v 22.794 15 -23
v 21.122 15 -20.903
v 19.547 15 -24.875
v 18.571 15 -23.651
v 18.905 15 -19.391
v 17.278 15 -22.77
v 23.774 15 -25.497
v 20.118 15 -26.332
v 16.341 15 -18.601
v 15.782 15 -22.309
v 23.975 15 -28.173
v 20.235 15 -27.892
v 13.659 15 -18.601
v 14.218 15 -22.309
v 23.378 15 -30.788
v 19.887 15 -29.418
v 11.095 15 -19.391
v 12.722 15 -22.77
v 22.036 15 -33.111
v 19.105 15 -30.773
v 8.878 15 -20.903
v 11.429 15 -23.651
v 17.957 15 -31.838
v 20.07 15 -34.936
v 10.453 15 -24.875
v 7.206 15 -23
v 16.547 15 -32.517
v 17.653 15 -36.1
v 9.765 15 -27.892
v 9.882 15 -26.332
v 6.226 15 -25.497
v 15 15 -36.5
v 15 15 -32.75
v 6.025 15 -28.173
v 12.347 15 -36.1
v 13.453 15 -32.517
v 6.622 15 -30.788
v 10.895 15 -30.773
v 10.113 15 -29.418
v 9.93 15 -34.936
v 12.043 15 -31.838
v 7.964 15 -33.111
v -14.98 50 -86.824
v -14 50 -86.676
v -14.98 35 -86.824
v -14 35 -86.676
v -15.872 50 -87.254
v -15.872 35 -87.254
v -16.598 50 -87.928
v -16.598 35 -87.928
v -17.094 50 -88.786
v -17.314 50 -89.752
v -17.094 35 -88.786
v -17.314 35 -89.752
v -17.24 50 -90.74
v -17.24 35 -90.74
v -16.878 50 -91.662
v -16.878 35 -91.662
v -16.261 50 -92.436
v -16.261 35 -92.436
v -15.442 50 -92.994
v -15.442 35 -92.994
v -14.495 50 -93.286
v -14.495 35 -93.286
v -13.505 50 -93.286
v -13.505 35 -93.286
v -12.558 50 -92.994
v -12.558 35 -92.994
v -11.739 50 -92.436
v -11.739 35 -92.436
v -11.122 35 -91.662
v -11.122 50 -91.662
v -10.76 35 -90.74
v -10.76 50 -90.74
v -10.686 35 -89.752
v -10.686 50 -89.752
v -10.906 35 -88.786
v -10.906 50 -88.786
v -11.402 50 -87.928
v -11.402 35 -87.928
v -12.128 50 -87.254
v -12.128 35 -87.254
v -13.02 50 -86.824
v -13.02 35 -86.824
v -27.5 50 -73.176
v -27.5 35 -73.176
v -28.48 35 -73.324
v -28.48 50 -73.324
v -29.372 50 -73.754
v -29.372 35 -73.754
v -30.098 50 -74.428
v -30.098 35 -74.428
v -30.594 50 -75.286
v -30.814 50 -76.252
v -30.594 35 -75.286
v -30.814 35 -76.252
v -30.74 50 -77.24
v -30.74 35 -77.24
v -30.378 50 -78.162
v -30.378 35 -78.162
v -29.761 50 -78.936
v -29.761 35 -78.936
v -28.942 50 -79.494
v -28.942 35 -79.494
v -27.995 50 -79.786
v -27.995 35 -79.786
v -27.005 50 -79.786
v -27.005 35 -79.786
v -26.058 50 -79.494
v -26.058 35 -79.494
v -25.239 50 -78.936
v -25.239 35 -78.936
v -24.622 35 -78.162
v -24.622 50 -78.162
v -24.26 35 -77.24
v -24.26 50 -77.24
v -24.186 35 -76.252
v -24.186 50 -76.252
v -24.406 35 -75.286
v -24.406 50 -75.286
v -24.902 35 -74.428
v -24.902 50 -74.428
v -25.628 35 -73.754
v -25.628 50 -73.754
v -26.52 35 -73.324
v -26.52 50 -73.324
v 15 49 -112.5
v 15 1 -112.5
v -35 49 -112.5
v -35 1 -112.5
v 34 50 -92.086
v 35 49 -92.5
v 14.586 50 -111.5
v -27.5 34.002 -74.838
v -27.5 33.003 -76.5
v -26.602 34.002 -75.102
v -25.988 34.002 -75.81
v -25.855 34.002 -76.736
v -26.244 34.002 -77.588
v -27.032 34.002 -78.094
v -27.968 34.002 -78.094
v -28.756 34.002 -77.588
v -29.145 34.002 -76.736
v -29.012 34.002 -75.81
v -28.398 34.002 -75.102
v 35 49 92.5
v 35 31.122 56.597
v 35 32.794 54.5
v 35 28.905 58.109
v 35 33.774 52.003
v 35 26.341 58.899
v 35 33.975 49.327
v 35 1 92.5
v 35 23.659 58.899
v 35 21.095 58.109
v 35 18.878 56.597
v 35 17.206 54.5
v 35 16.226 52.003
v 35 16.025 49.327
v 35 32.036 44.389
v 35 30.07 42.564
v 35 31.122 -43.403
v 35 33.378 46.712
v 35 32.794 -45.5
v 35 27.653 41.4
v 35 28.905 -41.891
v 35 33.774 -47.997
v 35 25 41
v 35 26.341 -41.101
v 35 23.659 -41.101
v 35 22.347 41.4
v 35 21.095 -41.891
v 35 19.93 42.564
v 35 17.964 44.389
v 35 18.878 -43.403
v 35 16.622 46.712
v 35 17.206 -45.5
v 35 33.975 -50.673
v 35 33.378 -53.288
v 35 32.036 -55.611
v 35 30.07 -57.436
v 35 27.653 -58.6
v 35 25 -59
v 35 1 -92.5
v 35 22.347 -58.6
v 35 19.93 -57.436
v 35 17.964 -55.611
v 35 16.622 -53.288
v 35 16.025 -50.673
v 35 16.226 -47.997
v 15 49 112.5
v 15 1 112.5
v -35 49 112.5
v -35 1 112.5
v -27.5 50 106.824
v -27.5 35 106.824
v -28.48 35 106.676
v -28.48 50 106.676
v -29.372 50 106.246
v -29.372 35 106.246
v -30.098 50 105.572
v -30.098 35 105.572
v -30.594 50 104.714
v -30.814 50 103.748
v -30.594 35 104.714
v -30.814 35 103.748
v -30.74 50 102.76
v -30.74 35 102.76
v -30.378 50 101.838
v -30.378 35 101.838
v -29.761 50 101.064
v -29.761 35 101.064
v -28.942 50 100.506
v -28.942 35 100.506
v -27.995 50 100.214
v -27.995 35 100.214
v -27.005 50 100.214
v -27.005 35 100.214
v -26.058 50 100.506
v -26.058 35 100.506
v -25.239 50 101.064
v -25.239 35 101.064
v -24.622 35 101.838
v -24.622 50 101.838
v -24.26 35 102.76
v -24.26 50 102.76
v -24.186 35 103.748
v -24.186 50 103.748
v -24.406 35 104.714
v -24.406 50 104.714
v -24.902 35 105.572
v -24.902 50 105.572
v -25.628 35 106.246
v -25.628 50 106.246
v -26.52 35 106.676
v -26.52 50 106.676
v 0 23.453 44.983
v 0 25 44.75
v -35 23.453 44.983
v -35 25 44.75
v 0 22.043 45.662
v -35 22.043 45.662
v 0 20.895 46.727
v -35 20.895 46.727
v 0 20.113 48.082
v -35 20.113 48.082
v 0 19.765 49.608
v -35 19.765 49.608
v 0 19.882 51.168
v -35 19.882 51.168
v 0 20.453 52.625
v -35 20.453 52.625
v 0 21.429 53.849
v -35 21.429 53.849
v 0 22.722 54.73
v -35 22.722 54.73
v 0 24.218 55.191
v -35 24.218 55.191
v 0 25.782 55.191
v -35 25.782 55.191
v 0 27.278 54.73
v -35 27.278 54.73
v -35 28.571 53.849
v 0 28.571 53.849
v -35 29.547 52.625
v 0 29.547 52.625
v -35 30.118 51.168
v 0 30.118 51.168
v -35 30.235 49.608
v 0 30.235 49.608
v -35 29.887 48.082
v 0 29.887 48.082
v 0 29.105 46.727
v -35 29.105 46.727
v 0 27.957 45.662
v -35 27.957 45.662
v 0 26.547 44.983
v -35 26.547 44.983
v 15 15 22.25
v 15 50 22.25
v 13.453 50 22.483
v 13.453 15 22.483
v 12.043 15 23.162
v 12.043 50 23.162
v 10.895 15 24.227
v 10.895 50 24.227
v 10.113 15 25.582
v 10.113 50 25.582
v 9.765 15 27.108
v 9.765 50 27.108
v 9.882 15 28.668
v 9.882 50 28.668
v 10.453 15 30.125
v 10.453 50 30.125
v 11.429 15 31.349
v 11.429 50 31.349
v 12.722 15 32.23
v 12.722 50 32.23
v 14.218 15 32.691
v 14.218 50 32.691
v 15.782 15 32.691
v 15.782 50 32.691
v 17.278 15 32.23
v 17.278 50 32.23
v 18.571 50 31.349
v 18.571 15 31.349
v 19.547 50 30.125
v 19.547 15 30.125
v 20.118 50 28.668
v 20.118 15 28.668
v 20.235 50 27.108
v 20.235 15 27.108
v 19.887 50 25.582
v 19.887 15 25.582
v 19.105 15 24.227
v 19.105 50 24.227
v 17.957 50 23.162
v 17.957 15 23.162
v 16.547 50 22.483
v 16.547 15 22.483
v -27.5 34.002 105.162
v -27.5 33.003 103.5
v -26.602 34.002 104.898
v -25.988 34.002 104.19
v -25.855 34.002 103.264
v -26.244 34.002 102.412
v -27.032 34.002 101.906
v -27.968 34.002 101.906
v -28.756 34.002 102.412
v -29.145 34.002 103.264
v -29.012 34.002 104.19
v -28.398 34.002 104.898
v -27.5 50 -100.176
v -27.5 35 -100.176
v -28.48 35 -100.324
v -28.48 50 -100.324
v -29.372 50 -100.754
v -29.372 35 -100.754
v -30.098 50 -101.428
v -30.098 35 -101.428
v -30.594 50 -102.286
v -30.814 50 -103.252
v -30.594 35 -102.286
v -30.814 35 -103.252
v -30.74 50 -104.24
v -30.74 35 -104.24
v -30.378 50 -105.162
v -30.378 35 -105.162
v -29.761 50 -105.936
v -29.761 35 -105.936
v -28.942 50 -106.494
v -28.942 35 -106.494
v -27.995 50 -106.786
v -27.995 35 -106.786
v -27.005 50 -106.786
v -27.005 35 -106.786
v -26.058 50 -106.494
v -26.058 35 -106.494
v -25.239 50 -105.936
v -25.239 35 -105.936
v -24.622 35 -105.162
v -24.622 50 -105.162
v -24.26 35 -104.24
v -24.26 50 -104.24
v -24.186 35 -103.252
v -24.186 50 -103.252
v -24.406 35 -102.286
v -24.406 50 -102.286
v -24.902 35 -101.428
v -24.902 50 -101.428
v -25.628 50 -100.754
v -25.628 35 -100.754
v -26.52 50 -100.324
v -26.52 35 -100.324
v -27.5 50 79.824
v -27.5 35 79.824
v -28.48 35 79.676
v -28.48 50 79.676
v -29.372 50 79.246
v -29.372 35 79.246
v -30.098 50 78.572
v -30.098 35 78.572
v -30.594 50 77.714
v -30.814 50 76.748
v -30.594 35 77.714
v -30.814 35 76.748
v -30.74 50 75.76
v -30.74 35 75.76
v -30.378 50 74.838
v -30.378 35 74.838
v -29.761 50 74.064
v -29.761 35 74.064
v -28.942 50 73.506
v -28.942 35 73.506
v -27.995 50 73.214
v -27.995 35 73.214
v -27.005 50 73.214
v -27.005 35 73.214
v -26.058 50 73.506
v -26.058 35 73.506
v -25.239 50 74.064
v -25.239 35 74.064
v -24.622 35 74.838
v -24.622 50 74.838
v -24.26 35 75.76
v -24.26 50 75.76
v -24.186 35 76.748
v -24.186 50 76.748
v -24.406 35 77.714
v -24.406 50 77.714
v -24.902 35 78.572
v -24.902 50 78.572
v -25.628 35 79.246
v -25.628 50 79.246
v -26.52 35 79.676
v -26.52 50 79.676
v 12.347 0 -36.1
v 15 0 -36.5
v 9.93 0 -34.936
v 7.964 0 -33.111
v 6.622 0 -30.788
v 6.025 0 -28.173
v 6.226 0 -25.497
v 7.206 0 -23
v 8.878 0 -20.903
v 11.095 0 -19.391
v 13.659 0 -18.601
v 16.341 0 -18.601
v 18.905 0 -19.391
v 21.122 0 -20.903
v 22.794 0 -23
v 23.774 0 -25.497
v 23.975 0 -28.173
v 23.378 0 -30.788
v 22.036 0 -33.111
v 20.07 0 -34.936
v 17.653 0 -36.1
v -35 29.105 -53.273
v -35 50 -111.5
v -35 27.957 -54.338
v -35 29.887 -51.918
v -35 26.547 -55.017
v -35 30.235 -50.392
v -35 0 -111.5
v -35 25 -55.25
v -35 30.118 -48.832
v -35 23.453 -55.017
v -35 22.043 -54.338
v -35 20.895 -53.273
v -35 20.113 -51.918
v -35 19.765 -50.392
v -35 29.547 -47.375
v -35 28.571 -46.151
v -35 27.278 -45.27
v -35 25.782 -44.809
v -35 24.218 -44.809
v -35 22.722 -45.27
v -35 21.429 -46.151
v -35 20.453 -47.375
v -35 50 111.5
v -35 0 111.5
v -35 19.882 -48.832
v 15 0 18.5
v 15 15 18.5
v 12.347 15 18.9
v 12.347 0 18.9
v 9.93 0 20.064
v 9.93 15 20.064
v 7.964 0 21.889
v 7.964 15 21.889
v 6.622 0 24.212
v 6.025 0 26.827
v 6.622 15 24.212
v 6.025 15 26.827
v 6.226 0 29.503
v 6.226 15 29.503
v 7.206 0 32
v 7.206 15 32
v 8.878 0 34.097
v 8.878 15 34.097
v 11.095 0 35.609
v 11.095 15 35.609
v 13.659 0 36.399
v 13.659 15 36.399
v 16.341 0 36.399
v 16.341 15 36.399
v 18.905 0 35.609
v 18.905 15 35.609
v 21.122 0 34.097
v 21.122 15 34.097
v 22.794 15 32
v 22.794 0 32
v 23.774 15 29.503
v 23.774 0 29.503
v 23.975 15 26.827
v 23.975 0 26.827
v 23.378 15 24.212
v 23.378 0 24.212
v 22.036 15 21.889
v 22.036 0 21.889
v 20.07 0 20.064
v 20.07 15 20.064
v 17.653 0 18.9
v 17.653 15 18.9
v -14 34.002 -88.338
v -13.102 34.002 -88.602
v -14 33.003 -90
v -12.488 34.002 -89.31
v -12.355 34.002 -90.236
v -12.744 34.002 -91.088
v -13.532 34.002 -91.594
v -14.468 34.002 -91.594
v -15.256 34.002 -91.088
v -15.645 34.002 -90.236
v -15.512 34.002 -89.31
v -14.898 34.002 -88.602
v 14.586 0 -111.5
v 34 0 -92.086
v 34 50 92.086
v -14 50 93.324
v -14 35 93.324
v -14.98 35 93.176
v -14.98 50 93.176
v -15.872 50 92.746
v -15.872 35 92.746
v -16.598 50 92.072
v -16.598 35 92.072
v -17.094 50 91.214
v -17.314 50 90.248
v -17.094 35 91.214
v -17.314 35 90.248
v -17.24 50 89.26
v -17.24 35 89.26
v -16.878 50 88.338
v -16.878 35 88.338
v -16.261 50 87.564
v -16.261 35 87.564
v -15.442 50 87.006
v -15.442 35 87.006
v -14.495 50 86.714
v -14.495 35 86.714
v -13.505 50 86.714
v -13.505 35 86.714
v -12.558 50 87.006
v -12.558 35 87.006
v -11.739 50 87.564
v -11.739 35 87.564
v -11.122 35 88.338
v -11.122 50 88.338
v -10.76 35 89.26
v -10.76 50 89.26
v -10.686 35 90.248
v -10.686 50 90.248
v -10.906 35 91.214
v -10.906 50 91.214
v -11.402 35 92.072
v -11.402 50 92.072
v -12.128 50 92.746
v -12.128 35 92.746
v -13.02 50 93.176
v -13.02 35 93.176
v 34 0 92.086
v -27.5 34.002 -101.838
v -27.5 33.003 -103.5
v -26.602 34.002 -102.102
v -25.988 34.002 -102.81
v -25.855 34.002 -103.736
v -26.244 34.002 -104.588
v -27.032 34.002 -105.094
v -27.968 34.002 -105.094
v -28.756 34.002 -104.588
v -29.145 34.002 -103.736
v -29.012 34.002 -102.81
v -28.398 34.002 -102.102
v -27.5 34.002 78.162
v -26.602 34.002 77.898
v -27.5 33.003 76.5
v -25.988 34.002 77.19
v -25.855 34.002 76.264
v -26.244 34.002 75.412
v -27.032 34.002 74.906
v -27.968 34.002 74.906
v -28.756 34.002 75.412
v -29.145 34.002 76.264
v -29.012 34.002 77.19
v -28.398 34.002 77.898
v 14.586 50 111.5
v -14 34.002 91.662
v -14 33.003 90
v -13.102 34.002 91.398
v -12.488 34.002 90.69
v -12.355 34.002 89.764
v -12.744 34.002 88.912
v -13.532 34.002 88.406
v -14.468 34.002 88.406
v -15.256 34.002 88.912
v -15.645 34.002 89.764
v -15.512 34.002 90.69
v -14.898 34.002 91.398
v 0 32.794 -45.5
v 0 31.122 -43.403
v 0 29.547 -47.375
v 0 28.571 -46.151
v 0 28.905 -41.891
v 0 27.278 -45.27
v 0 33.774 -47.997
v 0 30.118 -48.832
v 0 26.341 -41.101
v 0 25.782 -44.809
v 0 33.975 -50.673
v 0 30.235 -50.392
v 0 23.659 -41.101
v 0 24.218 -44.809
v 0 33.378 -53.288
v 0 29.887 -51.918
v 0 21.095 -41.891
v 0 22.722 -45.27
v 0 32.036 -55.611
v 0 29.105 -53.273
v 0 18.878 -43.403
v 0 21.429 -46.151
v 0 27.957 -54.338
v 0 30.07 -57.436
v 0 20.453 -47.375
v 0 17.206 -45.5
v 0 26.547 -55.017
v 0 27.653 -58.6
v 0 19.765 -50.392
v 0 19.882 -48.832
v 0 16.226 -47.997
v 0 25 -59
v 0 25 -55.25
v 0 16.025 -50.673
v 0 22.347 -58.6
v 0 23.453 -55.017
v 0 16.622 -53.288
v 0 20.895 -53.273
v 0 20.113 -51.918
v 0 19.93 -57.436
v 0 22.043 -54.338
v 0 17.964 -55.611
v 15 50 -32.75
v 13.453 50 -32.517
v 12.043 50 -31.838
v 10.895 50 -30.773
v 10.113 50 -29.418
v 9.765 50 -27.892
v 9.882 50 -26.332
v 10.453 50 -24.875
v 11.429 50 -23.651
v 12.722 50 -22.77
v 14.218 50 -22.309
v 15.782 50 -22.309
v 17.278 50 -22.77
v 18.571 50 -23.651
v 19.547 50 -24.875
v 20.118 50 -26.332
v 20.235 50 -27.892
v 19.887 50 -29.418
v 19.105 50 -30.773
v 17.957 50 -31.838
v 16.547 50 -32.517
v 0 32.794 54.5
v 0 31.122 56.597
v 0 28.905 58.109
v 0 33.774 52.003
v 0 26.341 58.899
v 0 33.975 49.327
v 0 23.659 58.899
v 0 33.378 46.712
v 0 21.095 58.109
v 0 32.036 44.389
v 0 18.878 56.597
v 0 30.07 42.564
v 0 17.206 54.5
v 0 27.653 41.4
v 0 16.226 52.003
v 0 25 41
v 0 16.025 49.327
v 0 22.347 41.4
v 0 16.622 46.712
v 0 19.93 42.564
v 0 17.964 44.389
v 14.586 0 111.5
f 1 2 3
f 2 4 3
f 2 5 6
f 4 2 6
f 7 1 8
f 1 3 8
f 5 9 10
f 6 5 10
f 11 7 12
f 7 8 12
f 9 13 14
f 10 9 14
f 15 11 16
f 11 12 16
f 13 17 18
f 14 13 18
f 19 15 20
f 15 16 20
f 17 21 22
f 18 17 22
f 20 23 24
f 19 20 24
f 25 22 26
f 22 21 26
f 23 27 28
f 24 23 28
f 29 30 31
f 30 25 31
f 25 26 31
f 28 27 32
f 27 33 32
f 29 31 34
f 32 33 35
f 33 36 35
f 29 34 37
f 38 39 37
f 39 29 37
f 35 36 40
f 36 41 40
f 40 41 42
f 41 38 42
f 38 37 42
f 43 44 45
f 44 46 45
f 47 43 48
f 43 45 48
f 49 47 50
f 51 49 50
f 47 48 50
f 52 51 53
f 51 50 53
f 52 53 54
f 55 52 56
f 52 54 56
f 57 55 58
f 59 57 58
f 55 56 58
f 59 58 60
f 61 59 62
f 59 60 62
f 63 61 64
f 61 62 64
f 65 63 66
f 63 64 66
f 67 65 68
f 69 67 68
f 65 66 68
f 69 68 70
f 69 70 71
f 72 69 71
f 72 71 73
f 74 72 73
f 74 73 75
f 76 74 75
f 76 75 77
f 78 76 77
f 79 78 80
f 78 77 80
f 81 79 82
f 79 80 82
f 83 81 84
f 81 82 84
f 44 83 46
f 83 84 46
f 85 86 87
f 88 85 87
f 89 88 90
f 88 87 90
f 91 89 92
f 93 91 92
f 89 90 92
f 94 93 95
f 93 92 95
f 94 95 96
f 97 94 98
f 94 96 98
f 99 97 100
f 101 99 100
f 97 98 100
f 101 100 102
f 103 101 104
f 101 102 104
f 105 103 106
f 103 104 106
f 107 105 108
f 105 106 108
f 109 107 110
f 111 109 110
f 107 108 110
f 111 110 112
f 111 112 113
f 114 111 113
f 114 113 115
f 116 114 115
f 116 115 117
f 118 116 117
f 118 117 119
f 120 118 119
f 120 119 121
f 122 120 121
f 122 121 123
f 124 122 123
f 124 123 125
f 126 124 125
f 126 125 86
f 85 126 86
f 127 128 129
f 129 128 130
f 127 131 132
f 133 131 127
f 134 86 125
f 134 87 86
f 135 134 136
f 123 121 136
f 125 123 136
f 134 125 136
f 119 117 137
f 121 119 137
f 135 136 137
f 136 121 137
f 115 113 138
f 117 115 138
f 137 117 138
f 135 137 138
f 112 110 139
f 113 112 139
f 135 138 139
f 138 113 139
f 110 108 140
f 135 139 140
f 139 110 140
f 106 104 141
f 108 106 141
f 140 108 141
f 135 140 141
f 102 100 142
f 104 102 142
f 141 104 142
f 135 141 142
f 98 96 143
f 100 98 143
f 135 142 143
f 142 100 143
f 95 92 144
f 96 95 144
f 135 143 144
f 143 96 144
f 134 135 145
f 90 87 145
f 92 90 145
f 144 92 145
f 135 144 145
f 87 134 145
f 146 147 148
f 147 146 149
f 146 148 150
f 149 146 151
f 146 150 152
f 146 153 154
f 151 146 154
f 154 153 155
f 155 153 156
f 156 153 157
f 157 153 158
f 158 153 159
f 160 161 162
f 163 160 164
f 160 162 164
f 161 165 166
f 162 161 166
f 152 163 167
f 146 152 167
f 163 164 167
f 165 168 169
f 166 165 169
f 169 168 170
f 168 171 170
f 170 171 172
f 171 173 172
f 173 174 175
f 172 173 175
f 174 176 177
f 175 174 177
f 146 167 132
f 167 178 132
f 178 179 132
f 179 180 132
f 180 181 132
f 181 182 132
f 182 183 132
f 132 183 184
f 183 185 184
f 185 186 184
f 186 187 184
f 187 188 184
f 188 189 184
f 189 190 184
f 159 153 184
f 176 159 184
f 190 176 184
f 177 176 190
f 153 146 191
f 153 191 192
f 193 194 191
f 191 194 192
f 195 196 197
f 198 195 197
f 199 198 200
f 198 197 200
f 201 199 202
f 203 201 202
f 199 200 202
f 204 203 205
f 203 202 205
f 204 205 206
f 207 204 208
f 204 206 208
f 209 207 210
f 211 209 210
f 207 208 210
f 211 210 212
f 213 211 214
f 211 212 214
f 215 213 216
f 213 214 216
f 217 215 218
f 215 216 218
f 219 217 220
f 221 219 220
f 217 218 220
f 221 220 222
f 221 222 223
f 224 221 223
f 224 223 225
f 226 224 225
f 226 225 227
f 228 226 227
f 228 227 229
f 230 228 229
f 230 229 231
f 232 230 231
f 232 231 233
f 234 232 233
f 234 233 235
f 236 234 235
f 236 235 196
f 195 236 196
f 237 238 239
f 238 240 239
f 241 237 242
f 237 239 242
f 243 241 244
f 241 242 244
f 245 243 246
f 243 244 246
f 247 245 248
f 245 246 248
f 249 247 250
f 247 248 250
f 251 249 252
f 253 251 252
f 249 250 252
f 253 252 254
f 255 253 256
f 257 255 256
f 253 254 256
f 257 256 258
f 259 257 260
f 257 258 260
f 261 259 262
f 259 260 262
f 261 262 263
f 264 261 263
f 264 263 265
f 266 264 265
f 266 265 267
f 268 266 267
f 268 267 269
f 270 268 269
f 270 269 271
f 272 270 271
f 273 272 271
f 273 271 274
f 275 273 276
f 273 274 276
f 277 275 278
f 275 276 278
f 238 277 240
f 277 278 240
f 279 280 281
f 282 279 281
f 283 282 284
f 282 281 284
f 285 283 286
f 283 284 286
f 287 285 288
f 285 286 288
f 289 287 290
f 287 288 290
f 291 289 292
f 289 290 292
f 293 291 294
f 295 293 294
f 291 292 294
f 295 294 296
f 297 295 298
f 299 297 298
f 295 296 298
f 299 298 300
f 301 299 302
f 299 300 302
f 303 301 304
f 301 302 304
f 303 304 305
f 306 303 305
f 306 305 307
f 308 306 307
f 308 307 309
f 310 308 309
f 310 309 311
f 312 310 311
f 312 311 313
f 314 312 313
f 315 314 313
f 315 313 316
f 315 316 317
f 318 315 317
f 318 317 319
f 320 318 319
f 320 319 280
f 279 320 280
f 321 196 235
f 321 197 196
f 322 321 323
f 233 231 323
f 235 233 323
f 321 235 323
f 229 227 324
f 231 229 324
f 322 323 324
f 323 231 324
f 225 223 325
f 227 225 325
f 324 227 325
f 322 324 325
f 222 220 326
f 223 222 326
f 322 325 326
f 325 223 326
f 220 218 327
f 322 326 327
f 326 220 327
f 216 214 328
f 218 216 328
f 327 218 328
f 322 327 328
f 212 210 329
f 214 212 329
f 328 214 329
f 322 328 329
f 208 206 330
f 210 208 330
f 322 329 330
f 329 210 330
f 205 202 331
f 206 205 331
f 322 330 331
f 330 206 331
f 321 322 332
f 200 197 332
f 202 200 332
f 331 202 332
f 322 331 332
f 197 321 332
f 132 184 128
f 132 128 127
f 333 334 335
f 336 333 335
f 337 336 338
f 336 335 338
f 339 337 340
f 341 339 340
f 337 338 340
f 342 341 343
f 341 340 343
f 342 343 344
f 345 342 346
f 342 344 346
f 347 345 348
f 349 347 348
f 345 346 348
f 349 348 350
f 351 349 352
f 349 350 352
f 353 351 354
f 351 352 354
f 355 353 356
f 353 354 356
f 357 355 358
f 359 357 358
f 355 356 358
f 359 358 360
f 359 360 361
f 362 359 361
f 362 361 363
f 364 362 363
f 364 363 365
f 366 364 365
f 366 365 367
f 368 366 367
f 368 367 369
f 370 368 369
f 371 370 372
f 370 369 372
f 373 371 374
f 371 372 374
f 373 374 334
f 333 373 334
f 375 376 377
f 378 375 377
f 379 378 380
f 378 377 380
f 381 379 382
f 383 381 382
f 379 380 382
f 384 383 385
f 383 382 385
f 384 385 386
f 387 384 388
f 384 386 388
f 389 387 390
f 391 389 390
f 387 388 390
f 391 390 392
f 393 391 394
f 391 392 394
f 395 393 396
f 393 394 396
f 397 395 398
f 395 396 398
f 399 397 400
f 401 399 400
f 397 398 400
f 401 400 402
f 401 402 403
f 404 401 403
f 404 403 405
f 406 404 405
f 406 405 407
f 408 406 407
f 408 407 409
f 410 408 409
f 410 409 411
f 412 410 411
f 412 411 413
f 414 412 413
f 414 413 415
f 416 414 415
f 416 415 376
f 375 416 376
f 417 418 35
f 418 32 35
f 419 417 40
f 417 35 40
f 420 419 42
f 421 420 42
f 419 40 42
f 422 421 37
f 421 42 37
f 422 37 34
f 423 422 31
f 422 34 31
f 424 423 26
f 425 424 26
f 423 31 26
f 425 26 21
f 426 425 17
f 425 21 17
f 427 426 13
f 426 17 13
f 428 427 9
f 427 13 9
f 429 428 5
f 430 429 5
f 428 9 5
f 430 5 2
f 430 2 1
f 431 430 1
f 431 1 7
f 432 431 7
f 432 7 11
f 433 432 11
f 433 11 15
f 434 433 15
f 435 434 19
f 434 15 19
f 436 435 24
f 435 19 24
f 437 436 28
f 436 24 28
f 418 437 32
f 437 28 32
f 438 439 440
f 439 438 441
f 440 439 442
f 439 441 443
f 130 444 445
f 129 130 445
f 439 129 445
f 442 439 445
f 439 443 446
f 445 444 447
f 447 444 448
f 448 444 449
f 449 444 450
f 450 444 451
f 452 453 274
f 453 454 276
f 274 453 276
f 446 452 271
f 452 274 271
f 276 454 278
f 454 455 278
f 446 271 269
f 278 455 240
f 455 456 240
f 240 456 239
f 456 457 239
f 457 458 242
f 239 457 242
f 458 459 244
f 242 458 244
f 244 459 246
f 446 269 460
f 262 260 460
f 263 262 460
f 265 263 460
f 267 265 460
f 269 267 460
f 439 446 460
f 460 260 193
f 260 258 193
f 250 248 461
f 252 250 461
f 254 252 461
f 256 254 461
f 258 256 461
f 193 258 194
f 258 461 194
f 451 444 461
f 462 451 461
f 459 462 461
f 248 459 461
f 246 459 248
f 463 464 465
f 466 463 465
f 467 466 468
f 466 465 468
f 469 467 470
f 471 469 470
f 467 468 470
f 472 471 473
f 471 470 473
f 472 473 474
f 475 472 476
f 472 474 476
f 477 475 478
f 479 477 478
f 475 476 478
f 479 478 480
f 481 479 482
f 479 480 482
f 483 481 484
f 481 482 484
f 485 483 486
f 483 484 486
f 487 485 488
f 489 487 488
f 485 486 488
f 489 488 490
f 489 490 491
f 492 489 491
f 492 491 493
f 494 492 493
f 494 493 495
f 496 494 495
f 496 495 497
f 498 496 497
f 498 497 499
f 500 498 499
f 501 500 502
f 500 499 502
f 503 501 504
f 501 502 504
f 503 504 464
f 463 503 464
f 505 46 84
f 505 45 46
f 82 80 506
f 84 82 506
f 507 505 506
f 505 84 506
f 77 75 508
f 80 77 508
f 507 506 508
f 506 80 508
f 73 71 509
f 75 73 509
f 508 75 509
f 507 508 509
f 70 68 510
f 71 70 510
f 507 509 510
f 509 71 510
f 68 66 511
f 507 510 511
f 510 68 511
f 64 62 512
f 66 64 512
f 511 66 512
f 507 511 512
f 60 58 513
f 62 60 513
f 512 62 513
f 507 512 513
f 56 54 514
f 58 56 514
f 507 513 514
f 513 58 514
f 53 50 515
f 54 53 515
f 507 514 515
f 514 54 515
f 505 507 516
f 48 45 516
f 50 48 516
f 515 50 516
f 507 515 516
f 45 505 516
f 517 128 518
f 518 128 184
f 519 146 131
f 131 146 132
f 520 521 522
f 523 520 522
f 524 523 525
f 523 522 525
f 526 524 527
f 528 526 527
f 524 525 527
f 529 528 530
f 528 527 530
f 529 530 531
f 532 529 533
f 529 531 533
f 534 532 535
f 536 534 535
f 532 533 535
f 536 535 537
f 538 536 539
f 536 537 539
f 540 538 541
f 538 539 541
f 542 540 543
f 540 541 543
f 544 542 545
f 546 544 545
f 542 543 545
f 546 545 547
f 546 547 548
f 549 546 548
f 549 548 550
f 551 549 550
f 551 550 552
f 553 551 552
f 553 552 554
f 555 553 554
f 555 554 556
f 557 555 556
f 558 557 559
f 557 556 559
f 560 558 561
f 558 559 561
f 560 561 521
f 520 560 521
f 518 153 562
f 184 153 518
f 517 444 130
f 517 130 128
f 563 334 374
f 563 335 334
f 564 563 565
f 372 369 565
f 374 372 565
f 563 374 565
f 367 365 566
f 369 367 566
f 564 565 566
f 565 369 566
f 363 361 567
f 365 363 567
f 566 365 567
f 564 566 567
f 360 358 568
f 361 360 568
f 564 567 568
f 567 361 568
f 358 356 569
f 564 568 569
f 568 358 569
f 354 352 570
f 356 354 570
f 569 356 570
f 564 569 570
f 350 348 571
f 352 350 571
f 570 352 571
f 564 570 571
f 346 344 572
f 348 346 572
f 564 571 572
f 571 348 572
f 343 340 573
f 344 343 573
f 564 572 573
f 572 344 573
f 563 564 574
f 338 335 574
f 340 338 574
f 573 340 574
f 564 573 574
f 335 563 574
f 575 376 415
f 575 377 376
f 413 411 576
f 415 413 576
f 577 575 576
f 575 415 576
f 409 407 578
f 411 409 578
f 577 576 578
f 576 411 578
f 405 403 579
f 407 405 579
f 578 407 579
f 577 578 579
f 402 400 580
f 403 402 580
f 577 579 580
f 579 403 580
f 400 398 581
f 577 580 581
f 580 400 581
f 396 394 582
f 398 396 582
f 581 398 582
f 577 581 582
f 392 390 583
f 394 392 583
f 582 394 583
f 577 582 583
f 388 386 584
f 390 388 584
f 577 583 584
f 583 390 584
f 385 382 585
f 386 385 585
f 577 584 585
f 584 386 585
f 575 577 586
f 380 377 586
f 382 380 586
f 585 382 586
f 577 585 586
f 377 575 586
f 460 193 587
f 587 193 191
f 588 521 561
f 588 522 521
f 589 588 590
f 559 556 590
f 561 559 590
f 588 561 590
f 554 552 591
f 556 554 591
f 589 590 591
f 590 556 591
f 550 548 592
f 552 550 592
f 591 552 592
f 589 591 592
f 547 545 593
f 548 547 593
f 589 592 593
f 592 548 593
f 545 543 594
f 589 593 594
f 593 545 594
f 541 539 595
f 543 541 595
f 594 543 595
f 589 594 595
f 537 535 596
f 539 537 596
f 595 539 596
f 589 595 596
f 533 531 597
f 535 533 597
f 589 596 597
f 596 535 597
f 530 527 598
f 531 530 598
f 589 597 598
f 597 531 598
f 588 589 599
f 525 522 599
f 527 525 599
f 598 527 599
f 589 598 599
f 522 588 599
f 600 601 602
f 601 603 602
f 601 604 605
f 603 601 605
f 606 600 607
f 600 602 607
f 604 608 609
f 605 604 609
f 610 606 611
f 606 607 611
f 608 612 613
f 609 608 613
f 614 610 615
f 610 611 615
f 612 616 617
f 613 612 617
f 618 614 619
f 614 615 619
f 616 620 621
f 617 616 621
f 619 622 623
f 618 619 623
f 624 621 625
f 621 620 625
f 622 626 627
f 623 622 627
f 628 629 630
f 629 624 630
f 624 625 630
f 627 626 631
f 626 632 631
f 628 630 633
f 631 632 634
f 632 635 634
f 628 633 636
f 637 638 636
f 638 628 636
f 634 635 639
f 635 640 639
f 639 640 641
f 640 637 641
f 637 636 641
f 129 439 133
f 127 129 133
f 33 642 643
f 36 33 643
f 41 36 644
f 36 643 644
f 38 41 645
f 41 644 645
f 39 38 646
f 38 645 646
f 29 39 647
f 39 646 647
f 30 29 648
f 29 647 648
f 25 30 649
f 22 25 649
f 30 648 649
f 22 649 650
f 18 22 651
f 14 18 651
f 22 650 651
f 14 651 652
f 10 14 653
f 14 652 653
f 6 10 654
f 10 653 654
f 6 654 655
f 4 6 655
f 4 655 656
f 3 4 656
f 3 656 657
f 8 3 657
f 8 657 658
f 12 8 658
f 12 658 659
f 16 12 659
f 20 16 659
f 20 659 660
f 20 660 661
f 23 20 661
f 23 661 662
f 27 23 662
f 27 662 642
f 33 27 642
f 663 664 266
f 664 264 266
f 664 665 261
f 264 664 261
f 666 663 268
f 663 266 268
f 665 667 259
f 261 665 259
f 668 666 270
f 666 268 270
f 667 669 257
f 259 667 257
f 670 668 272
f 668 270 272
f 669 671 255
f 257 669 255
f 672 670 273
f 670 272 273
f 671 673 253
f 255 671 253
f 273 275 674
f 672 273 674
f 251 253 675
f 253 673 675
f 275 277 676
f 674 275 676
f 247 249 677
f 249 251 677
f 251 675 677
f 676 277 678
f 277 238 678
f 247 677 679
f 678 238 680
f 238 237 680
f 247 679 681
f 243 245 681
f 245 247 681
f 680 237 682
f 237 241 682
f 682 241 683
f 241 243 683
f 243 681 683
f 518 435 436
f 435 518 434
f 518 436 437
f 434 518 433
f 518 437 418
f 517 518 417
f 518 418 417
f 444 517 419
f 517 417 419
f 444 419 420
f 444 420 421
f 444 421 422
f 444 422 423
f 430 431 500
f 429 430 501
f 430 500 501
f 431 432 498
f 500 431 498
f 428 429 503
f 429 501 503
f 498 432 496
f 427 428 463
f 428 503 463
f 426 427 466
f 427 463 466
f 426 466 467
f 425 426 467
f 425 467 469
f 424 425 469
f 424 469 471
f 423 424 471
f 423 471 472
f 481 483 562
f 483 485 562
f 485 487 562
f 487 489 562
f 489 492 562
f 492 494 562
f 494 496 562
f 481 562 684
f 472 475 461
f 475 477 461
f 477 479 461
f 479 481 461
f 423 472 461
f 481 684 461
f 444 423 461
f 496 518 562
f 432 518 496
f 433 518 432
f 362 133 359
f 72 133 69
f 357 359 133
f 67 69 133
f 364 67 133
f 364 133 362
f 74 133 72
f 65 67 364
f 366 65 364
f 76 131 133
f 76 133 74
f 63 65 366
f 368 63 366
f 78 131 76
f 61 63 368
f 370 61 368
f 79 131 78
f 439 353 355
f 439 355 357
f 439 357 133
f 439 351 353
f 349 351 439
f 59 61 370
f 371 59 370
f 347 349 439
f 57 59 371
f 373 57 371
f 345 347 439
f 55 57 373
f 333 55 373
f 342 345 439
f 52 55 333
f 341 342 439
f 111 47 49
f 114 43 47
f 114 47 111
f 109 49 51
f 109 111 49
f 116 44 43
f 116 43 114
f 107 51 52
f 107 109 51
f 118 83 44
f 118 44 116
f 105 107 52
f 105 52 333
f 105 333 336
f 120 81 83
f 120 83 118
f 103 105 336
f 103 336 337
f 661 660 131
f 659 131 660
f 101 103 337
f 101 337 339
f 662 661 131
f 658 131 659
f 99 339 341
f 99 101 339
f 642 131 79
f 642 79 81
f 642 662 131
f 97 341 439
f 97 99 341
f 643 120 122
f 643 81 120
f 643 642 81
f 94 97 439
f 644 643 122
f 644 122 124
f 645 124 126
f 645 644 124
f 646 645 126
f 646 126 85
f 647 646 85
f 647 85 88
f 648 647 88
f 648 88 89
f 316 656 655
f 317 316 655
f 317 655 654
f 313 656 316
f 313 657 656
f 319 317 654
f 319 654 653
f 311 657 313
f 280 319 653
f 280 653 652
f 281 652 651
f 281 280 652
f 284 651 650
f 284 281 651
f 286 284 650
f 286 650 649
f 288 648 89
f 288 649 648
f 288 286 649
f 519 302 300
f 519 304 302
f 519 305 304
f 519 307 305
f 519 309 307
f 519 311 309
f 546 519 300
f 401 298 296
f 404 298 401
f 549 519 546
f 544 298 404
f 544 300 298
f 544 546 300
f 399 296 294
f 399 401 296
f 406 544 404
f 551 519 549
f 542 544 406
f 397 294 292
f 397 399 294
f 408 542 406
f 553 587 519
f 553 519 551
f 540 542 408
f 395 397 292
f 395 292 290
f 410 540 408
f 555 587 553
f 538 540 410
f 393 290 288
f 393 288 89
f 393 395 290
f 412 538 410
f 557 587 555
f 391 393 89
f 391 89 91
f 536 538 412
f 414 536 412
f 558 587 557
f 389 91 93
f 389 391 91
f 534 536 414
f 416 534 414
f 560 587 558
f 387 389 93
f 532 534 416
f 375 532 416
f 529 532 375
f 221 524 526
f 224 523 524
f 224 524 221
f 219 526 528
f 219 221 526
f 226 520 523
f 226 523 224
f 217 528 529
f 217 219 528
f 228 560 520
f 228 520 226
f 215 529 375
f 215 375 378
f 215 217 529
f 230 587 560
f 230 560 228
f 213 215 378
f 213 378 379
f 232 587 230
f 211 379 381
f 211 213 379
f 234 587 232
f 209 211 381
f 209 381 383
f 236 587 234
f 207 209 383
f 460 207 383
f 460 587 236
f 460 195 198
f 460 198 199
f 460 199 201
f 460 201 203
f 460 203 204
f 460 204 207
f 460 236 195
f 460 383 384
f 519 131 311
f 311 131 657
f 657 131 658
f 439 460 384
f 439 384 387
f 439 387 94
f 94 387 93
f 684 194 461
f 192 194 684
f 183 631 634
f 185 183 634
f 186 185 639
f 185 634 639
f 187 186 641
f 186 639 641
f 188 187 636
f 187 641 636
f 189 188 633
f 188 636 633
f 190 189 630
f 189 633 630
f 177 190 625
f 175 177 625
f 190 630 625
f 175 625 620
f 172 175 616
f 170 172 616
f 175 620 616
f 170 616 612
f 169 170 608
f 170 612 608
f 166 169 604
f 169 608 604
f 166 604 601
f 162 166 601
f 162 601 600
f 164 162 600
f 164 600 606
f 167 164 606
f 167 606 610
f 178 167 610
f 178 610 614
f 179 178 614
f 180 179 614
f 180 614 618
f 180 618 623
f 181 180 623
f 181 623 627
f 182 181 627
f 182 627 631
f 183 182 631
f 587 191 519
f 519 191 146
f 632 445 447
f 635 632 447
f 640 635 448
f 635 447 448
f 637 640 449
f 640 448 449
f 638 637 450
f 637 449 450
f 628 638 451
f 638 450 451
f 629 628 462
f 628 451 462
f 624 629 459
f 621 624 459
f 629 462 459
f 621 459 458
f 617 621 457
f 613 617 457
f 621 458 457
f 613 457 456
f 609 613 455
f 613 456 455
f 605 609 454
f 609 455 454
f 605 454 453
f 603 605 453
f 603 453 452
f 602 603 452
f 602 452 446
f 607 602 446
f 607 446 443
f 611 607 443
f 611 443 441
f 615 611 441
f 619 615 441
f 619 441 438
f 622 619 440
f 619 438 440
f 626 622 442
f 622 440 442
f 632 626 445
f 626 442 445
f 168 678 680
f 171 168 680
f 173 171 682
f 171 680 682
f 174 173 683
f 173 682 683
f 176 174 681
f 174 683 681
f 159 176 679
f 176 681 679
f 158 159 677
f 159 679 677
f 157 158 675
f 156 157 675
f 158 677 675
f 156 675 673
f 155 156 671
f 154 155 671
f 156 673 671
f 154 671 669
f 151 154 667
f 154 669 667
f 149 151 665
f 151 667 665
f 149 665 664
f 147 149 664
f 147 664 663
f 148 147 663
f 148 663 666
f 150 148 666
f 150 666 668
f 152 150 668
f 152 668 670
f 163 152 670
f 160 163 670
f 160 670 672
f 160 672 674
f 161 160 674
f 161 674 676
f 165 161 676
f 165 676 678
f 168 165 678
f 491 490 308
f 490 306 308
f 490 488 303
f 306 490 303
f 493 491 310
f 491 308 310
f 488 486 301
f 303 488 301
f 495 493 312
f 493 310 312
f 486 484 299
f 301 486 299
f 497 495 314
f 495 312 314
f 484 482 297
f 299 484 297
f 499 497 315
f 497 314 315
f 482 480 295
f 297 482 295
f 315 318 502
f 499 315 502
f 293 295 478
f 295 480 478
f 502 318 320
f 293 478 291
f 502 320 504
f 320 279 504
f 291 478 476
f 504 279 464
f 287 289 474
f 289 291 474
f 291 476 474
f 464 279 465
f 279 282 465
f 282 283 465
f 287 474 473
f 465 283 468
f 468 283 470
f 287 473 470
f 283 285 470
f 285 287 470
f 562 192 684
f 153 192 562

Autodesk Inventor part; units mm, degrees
ref_plane "YZ Plane" through (0, 0, 0) normal (1, 0, 0) x (0, 1, 0)
ref_plane "XZ Plane" through (0, 0, 0) normal (0, 1, 0) x (-1, 0, 0)
ref_plane "XY Plane" through (0, 0, 0) normal (0, 0, 1) x (1, 0, 0)
sketch "Sketch1" plane through (0, 0, 0) normal (0, 1, 0) x (-1, 0, 0)
  line L0 (35, 112.5) -> (-35, 112.5)
  line L1 (-35, 112.5) -> (-35, -112.5)
  line L2 (-35, -112.5) -> (35, -112.5)
  line L3 (35, -112.5) -> (35, 112.5)
  point P0 (0, 0)
  point P1 (35, 0)
  point P2 (0, -112.5)
  dimension "d0" = 225
  dimension "d1" = 70
extrude "Extrusion1" add sketch "Sketch1" along normal blind 50
sketch "Sketch2" plane through (35, 0, 112.5) normal (1, 0, 0) x (0, 0, -1)
  circle A0 centre (62.5, 25) radius 5
  circle A1 centre (162.5, 25) radius 5
  line L0 (225, 0) -> (225, 50) projected
  point P0 (0, 50)
  point P1 (112.5, 0)
  point P2 (225, 25)
  dimension "d5" = 50
  dimension "d6" = 50
  dimension "d8" = 225
  dimension "d33" = 10
hole "Hole1" at (35, 25, 50) at (35, 25, -50) direction (-1, 0, 0) diameter 10.5 end through all counterbore diameter 18 counterbore depth 35 clearance for "Socket Head Cap Screw DIN EN ISO 4762" size "M10" standard "DIN"
sketch "Sketch3" plane through (0, 0, 0) normal (0, -1, 0) x (1, 0, 0)
  line L0 (35, 112.5) -> (35, -112.5) projected
  circle A0 centre (15, 27.5) radius 5
  circle A1 centre (15, -27.5) radius 5
  point P0 (0, 0)
  dimension "d17" = 55
  dimension "d18" = 20
  dimension "d21" = 27.5
  dimension "d32" = 10
hole "Hole2" at (15, 0, 27.5) at (15, 0, -27.5) direction (0, 1, 0) diameter 10.5 end through all counterbore diameter 18 counterbore depth 15 clearance for "Socket Head Cap Screw DIN EN ISO 4762" size "M10" standard "DIN"
chamfer "Chamfer1" distance 20 angle 45 2 edges at (35, 25, 112.5) (35, 25, -112.5)
sketch "Sketch4" plane through (0, 50, 0) normal (0, 1, 0) x (1, 0, 0)
  line L0 (-35, 112.5) -> (-35, -112.5) projected
  circle A0 centre (-27.5, -103.5) radius 4
  circle A1 centre (-27.5, -76.5) radius 4
  circle A2 centre (-14, -90) radius 4
  line L1 (0, 0) -> (7.2062, 0) construction
  circle A3 centre (-27.5, 103.5) radius 4
  circle A4 centre (-27.5, 76.5) radius 4
  circle A5 centre (-14, 90) radius 4
  dimension "d36" = 13.5
  dimension "d37" = 27
  dimension "d38" = 8
  dimension "d39" = 7.5
  dimension "d40" = 8
  dimension "d41" = 90
  dimension "d42" = 13.5
hole "Hole3" at (-27.5, 50, 103.5) at (-14, 50, 90) at (-27.5, 50, 76.5) at (-27.5, 50, -76.5) at (-14, 50, -90) at (-27.5, 50, -103.5) direction (0, -1, 0) diameter 6.647 depth 15 tip angle 118 thread size "M8x1.25" class "6H" standard "ISO Metric profile"
chamfer "Chamfer2" distance 1 angle 45 10 edges at (-10, 50, 112.5) (25, 50, 102.5) (35, 50, 0) (25, 50, -102.5) (-10, 50, -112.5) (-10, 0, 112.5) (25, 0, 102.5) (35, 0, 0) (25, 0, -102.5) (-10, 0, -112.5)
equation "\"d6\" = d5"
equation "\"d21\" = 0.5 * d17"
properties part number "BC-10008" material "Aço Carbono AISI 1006"
